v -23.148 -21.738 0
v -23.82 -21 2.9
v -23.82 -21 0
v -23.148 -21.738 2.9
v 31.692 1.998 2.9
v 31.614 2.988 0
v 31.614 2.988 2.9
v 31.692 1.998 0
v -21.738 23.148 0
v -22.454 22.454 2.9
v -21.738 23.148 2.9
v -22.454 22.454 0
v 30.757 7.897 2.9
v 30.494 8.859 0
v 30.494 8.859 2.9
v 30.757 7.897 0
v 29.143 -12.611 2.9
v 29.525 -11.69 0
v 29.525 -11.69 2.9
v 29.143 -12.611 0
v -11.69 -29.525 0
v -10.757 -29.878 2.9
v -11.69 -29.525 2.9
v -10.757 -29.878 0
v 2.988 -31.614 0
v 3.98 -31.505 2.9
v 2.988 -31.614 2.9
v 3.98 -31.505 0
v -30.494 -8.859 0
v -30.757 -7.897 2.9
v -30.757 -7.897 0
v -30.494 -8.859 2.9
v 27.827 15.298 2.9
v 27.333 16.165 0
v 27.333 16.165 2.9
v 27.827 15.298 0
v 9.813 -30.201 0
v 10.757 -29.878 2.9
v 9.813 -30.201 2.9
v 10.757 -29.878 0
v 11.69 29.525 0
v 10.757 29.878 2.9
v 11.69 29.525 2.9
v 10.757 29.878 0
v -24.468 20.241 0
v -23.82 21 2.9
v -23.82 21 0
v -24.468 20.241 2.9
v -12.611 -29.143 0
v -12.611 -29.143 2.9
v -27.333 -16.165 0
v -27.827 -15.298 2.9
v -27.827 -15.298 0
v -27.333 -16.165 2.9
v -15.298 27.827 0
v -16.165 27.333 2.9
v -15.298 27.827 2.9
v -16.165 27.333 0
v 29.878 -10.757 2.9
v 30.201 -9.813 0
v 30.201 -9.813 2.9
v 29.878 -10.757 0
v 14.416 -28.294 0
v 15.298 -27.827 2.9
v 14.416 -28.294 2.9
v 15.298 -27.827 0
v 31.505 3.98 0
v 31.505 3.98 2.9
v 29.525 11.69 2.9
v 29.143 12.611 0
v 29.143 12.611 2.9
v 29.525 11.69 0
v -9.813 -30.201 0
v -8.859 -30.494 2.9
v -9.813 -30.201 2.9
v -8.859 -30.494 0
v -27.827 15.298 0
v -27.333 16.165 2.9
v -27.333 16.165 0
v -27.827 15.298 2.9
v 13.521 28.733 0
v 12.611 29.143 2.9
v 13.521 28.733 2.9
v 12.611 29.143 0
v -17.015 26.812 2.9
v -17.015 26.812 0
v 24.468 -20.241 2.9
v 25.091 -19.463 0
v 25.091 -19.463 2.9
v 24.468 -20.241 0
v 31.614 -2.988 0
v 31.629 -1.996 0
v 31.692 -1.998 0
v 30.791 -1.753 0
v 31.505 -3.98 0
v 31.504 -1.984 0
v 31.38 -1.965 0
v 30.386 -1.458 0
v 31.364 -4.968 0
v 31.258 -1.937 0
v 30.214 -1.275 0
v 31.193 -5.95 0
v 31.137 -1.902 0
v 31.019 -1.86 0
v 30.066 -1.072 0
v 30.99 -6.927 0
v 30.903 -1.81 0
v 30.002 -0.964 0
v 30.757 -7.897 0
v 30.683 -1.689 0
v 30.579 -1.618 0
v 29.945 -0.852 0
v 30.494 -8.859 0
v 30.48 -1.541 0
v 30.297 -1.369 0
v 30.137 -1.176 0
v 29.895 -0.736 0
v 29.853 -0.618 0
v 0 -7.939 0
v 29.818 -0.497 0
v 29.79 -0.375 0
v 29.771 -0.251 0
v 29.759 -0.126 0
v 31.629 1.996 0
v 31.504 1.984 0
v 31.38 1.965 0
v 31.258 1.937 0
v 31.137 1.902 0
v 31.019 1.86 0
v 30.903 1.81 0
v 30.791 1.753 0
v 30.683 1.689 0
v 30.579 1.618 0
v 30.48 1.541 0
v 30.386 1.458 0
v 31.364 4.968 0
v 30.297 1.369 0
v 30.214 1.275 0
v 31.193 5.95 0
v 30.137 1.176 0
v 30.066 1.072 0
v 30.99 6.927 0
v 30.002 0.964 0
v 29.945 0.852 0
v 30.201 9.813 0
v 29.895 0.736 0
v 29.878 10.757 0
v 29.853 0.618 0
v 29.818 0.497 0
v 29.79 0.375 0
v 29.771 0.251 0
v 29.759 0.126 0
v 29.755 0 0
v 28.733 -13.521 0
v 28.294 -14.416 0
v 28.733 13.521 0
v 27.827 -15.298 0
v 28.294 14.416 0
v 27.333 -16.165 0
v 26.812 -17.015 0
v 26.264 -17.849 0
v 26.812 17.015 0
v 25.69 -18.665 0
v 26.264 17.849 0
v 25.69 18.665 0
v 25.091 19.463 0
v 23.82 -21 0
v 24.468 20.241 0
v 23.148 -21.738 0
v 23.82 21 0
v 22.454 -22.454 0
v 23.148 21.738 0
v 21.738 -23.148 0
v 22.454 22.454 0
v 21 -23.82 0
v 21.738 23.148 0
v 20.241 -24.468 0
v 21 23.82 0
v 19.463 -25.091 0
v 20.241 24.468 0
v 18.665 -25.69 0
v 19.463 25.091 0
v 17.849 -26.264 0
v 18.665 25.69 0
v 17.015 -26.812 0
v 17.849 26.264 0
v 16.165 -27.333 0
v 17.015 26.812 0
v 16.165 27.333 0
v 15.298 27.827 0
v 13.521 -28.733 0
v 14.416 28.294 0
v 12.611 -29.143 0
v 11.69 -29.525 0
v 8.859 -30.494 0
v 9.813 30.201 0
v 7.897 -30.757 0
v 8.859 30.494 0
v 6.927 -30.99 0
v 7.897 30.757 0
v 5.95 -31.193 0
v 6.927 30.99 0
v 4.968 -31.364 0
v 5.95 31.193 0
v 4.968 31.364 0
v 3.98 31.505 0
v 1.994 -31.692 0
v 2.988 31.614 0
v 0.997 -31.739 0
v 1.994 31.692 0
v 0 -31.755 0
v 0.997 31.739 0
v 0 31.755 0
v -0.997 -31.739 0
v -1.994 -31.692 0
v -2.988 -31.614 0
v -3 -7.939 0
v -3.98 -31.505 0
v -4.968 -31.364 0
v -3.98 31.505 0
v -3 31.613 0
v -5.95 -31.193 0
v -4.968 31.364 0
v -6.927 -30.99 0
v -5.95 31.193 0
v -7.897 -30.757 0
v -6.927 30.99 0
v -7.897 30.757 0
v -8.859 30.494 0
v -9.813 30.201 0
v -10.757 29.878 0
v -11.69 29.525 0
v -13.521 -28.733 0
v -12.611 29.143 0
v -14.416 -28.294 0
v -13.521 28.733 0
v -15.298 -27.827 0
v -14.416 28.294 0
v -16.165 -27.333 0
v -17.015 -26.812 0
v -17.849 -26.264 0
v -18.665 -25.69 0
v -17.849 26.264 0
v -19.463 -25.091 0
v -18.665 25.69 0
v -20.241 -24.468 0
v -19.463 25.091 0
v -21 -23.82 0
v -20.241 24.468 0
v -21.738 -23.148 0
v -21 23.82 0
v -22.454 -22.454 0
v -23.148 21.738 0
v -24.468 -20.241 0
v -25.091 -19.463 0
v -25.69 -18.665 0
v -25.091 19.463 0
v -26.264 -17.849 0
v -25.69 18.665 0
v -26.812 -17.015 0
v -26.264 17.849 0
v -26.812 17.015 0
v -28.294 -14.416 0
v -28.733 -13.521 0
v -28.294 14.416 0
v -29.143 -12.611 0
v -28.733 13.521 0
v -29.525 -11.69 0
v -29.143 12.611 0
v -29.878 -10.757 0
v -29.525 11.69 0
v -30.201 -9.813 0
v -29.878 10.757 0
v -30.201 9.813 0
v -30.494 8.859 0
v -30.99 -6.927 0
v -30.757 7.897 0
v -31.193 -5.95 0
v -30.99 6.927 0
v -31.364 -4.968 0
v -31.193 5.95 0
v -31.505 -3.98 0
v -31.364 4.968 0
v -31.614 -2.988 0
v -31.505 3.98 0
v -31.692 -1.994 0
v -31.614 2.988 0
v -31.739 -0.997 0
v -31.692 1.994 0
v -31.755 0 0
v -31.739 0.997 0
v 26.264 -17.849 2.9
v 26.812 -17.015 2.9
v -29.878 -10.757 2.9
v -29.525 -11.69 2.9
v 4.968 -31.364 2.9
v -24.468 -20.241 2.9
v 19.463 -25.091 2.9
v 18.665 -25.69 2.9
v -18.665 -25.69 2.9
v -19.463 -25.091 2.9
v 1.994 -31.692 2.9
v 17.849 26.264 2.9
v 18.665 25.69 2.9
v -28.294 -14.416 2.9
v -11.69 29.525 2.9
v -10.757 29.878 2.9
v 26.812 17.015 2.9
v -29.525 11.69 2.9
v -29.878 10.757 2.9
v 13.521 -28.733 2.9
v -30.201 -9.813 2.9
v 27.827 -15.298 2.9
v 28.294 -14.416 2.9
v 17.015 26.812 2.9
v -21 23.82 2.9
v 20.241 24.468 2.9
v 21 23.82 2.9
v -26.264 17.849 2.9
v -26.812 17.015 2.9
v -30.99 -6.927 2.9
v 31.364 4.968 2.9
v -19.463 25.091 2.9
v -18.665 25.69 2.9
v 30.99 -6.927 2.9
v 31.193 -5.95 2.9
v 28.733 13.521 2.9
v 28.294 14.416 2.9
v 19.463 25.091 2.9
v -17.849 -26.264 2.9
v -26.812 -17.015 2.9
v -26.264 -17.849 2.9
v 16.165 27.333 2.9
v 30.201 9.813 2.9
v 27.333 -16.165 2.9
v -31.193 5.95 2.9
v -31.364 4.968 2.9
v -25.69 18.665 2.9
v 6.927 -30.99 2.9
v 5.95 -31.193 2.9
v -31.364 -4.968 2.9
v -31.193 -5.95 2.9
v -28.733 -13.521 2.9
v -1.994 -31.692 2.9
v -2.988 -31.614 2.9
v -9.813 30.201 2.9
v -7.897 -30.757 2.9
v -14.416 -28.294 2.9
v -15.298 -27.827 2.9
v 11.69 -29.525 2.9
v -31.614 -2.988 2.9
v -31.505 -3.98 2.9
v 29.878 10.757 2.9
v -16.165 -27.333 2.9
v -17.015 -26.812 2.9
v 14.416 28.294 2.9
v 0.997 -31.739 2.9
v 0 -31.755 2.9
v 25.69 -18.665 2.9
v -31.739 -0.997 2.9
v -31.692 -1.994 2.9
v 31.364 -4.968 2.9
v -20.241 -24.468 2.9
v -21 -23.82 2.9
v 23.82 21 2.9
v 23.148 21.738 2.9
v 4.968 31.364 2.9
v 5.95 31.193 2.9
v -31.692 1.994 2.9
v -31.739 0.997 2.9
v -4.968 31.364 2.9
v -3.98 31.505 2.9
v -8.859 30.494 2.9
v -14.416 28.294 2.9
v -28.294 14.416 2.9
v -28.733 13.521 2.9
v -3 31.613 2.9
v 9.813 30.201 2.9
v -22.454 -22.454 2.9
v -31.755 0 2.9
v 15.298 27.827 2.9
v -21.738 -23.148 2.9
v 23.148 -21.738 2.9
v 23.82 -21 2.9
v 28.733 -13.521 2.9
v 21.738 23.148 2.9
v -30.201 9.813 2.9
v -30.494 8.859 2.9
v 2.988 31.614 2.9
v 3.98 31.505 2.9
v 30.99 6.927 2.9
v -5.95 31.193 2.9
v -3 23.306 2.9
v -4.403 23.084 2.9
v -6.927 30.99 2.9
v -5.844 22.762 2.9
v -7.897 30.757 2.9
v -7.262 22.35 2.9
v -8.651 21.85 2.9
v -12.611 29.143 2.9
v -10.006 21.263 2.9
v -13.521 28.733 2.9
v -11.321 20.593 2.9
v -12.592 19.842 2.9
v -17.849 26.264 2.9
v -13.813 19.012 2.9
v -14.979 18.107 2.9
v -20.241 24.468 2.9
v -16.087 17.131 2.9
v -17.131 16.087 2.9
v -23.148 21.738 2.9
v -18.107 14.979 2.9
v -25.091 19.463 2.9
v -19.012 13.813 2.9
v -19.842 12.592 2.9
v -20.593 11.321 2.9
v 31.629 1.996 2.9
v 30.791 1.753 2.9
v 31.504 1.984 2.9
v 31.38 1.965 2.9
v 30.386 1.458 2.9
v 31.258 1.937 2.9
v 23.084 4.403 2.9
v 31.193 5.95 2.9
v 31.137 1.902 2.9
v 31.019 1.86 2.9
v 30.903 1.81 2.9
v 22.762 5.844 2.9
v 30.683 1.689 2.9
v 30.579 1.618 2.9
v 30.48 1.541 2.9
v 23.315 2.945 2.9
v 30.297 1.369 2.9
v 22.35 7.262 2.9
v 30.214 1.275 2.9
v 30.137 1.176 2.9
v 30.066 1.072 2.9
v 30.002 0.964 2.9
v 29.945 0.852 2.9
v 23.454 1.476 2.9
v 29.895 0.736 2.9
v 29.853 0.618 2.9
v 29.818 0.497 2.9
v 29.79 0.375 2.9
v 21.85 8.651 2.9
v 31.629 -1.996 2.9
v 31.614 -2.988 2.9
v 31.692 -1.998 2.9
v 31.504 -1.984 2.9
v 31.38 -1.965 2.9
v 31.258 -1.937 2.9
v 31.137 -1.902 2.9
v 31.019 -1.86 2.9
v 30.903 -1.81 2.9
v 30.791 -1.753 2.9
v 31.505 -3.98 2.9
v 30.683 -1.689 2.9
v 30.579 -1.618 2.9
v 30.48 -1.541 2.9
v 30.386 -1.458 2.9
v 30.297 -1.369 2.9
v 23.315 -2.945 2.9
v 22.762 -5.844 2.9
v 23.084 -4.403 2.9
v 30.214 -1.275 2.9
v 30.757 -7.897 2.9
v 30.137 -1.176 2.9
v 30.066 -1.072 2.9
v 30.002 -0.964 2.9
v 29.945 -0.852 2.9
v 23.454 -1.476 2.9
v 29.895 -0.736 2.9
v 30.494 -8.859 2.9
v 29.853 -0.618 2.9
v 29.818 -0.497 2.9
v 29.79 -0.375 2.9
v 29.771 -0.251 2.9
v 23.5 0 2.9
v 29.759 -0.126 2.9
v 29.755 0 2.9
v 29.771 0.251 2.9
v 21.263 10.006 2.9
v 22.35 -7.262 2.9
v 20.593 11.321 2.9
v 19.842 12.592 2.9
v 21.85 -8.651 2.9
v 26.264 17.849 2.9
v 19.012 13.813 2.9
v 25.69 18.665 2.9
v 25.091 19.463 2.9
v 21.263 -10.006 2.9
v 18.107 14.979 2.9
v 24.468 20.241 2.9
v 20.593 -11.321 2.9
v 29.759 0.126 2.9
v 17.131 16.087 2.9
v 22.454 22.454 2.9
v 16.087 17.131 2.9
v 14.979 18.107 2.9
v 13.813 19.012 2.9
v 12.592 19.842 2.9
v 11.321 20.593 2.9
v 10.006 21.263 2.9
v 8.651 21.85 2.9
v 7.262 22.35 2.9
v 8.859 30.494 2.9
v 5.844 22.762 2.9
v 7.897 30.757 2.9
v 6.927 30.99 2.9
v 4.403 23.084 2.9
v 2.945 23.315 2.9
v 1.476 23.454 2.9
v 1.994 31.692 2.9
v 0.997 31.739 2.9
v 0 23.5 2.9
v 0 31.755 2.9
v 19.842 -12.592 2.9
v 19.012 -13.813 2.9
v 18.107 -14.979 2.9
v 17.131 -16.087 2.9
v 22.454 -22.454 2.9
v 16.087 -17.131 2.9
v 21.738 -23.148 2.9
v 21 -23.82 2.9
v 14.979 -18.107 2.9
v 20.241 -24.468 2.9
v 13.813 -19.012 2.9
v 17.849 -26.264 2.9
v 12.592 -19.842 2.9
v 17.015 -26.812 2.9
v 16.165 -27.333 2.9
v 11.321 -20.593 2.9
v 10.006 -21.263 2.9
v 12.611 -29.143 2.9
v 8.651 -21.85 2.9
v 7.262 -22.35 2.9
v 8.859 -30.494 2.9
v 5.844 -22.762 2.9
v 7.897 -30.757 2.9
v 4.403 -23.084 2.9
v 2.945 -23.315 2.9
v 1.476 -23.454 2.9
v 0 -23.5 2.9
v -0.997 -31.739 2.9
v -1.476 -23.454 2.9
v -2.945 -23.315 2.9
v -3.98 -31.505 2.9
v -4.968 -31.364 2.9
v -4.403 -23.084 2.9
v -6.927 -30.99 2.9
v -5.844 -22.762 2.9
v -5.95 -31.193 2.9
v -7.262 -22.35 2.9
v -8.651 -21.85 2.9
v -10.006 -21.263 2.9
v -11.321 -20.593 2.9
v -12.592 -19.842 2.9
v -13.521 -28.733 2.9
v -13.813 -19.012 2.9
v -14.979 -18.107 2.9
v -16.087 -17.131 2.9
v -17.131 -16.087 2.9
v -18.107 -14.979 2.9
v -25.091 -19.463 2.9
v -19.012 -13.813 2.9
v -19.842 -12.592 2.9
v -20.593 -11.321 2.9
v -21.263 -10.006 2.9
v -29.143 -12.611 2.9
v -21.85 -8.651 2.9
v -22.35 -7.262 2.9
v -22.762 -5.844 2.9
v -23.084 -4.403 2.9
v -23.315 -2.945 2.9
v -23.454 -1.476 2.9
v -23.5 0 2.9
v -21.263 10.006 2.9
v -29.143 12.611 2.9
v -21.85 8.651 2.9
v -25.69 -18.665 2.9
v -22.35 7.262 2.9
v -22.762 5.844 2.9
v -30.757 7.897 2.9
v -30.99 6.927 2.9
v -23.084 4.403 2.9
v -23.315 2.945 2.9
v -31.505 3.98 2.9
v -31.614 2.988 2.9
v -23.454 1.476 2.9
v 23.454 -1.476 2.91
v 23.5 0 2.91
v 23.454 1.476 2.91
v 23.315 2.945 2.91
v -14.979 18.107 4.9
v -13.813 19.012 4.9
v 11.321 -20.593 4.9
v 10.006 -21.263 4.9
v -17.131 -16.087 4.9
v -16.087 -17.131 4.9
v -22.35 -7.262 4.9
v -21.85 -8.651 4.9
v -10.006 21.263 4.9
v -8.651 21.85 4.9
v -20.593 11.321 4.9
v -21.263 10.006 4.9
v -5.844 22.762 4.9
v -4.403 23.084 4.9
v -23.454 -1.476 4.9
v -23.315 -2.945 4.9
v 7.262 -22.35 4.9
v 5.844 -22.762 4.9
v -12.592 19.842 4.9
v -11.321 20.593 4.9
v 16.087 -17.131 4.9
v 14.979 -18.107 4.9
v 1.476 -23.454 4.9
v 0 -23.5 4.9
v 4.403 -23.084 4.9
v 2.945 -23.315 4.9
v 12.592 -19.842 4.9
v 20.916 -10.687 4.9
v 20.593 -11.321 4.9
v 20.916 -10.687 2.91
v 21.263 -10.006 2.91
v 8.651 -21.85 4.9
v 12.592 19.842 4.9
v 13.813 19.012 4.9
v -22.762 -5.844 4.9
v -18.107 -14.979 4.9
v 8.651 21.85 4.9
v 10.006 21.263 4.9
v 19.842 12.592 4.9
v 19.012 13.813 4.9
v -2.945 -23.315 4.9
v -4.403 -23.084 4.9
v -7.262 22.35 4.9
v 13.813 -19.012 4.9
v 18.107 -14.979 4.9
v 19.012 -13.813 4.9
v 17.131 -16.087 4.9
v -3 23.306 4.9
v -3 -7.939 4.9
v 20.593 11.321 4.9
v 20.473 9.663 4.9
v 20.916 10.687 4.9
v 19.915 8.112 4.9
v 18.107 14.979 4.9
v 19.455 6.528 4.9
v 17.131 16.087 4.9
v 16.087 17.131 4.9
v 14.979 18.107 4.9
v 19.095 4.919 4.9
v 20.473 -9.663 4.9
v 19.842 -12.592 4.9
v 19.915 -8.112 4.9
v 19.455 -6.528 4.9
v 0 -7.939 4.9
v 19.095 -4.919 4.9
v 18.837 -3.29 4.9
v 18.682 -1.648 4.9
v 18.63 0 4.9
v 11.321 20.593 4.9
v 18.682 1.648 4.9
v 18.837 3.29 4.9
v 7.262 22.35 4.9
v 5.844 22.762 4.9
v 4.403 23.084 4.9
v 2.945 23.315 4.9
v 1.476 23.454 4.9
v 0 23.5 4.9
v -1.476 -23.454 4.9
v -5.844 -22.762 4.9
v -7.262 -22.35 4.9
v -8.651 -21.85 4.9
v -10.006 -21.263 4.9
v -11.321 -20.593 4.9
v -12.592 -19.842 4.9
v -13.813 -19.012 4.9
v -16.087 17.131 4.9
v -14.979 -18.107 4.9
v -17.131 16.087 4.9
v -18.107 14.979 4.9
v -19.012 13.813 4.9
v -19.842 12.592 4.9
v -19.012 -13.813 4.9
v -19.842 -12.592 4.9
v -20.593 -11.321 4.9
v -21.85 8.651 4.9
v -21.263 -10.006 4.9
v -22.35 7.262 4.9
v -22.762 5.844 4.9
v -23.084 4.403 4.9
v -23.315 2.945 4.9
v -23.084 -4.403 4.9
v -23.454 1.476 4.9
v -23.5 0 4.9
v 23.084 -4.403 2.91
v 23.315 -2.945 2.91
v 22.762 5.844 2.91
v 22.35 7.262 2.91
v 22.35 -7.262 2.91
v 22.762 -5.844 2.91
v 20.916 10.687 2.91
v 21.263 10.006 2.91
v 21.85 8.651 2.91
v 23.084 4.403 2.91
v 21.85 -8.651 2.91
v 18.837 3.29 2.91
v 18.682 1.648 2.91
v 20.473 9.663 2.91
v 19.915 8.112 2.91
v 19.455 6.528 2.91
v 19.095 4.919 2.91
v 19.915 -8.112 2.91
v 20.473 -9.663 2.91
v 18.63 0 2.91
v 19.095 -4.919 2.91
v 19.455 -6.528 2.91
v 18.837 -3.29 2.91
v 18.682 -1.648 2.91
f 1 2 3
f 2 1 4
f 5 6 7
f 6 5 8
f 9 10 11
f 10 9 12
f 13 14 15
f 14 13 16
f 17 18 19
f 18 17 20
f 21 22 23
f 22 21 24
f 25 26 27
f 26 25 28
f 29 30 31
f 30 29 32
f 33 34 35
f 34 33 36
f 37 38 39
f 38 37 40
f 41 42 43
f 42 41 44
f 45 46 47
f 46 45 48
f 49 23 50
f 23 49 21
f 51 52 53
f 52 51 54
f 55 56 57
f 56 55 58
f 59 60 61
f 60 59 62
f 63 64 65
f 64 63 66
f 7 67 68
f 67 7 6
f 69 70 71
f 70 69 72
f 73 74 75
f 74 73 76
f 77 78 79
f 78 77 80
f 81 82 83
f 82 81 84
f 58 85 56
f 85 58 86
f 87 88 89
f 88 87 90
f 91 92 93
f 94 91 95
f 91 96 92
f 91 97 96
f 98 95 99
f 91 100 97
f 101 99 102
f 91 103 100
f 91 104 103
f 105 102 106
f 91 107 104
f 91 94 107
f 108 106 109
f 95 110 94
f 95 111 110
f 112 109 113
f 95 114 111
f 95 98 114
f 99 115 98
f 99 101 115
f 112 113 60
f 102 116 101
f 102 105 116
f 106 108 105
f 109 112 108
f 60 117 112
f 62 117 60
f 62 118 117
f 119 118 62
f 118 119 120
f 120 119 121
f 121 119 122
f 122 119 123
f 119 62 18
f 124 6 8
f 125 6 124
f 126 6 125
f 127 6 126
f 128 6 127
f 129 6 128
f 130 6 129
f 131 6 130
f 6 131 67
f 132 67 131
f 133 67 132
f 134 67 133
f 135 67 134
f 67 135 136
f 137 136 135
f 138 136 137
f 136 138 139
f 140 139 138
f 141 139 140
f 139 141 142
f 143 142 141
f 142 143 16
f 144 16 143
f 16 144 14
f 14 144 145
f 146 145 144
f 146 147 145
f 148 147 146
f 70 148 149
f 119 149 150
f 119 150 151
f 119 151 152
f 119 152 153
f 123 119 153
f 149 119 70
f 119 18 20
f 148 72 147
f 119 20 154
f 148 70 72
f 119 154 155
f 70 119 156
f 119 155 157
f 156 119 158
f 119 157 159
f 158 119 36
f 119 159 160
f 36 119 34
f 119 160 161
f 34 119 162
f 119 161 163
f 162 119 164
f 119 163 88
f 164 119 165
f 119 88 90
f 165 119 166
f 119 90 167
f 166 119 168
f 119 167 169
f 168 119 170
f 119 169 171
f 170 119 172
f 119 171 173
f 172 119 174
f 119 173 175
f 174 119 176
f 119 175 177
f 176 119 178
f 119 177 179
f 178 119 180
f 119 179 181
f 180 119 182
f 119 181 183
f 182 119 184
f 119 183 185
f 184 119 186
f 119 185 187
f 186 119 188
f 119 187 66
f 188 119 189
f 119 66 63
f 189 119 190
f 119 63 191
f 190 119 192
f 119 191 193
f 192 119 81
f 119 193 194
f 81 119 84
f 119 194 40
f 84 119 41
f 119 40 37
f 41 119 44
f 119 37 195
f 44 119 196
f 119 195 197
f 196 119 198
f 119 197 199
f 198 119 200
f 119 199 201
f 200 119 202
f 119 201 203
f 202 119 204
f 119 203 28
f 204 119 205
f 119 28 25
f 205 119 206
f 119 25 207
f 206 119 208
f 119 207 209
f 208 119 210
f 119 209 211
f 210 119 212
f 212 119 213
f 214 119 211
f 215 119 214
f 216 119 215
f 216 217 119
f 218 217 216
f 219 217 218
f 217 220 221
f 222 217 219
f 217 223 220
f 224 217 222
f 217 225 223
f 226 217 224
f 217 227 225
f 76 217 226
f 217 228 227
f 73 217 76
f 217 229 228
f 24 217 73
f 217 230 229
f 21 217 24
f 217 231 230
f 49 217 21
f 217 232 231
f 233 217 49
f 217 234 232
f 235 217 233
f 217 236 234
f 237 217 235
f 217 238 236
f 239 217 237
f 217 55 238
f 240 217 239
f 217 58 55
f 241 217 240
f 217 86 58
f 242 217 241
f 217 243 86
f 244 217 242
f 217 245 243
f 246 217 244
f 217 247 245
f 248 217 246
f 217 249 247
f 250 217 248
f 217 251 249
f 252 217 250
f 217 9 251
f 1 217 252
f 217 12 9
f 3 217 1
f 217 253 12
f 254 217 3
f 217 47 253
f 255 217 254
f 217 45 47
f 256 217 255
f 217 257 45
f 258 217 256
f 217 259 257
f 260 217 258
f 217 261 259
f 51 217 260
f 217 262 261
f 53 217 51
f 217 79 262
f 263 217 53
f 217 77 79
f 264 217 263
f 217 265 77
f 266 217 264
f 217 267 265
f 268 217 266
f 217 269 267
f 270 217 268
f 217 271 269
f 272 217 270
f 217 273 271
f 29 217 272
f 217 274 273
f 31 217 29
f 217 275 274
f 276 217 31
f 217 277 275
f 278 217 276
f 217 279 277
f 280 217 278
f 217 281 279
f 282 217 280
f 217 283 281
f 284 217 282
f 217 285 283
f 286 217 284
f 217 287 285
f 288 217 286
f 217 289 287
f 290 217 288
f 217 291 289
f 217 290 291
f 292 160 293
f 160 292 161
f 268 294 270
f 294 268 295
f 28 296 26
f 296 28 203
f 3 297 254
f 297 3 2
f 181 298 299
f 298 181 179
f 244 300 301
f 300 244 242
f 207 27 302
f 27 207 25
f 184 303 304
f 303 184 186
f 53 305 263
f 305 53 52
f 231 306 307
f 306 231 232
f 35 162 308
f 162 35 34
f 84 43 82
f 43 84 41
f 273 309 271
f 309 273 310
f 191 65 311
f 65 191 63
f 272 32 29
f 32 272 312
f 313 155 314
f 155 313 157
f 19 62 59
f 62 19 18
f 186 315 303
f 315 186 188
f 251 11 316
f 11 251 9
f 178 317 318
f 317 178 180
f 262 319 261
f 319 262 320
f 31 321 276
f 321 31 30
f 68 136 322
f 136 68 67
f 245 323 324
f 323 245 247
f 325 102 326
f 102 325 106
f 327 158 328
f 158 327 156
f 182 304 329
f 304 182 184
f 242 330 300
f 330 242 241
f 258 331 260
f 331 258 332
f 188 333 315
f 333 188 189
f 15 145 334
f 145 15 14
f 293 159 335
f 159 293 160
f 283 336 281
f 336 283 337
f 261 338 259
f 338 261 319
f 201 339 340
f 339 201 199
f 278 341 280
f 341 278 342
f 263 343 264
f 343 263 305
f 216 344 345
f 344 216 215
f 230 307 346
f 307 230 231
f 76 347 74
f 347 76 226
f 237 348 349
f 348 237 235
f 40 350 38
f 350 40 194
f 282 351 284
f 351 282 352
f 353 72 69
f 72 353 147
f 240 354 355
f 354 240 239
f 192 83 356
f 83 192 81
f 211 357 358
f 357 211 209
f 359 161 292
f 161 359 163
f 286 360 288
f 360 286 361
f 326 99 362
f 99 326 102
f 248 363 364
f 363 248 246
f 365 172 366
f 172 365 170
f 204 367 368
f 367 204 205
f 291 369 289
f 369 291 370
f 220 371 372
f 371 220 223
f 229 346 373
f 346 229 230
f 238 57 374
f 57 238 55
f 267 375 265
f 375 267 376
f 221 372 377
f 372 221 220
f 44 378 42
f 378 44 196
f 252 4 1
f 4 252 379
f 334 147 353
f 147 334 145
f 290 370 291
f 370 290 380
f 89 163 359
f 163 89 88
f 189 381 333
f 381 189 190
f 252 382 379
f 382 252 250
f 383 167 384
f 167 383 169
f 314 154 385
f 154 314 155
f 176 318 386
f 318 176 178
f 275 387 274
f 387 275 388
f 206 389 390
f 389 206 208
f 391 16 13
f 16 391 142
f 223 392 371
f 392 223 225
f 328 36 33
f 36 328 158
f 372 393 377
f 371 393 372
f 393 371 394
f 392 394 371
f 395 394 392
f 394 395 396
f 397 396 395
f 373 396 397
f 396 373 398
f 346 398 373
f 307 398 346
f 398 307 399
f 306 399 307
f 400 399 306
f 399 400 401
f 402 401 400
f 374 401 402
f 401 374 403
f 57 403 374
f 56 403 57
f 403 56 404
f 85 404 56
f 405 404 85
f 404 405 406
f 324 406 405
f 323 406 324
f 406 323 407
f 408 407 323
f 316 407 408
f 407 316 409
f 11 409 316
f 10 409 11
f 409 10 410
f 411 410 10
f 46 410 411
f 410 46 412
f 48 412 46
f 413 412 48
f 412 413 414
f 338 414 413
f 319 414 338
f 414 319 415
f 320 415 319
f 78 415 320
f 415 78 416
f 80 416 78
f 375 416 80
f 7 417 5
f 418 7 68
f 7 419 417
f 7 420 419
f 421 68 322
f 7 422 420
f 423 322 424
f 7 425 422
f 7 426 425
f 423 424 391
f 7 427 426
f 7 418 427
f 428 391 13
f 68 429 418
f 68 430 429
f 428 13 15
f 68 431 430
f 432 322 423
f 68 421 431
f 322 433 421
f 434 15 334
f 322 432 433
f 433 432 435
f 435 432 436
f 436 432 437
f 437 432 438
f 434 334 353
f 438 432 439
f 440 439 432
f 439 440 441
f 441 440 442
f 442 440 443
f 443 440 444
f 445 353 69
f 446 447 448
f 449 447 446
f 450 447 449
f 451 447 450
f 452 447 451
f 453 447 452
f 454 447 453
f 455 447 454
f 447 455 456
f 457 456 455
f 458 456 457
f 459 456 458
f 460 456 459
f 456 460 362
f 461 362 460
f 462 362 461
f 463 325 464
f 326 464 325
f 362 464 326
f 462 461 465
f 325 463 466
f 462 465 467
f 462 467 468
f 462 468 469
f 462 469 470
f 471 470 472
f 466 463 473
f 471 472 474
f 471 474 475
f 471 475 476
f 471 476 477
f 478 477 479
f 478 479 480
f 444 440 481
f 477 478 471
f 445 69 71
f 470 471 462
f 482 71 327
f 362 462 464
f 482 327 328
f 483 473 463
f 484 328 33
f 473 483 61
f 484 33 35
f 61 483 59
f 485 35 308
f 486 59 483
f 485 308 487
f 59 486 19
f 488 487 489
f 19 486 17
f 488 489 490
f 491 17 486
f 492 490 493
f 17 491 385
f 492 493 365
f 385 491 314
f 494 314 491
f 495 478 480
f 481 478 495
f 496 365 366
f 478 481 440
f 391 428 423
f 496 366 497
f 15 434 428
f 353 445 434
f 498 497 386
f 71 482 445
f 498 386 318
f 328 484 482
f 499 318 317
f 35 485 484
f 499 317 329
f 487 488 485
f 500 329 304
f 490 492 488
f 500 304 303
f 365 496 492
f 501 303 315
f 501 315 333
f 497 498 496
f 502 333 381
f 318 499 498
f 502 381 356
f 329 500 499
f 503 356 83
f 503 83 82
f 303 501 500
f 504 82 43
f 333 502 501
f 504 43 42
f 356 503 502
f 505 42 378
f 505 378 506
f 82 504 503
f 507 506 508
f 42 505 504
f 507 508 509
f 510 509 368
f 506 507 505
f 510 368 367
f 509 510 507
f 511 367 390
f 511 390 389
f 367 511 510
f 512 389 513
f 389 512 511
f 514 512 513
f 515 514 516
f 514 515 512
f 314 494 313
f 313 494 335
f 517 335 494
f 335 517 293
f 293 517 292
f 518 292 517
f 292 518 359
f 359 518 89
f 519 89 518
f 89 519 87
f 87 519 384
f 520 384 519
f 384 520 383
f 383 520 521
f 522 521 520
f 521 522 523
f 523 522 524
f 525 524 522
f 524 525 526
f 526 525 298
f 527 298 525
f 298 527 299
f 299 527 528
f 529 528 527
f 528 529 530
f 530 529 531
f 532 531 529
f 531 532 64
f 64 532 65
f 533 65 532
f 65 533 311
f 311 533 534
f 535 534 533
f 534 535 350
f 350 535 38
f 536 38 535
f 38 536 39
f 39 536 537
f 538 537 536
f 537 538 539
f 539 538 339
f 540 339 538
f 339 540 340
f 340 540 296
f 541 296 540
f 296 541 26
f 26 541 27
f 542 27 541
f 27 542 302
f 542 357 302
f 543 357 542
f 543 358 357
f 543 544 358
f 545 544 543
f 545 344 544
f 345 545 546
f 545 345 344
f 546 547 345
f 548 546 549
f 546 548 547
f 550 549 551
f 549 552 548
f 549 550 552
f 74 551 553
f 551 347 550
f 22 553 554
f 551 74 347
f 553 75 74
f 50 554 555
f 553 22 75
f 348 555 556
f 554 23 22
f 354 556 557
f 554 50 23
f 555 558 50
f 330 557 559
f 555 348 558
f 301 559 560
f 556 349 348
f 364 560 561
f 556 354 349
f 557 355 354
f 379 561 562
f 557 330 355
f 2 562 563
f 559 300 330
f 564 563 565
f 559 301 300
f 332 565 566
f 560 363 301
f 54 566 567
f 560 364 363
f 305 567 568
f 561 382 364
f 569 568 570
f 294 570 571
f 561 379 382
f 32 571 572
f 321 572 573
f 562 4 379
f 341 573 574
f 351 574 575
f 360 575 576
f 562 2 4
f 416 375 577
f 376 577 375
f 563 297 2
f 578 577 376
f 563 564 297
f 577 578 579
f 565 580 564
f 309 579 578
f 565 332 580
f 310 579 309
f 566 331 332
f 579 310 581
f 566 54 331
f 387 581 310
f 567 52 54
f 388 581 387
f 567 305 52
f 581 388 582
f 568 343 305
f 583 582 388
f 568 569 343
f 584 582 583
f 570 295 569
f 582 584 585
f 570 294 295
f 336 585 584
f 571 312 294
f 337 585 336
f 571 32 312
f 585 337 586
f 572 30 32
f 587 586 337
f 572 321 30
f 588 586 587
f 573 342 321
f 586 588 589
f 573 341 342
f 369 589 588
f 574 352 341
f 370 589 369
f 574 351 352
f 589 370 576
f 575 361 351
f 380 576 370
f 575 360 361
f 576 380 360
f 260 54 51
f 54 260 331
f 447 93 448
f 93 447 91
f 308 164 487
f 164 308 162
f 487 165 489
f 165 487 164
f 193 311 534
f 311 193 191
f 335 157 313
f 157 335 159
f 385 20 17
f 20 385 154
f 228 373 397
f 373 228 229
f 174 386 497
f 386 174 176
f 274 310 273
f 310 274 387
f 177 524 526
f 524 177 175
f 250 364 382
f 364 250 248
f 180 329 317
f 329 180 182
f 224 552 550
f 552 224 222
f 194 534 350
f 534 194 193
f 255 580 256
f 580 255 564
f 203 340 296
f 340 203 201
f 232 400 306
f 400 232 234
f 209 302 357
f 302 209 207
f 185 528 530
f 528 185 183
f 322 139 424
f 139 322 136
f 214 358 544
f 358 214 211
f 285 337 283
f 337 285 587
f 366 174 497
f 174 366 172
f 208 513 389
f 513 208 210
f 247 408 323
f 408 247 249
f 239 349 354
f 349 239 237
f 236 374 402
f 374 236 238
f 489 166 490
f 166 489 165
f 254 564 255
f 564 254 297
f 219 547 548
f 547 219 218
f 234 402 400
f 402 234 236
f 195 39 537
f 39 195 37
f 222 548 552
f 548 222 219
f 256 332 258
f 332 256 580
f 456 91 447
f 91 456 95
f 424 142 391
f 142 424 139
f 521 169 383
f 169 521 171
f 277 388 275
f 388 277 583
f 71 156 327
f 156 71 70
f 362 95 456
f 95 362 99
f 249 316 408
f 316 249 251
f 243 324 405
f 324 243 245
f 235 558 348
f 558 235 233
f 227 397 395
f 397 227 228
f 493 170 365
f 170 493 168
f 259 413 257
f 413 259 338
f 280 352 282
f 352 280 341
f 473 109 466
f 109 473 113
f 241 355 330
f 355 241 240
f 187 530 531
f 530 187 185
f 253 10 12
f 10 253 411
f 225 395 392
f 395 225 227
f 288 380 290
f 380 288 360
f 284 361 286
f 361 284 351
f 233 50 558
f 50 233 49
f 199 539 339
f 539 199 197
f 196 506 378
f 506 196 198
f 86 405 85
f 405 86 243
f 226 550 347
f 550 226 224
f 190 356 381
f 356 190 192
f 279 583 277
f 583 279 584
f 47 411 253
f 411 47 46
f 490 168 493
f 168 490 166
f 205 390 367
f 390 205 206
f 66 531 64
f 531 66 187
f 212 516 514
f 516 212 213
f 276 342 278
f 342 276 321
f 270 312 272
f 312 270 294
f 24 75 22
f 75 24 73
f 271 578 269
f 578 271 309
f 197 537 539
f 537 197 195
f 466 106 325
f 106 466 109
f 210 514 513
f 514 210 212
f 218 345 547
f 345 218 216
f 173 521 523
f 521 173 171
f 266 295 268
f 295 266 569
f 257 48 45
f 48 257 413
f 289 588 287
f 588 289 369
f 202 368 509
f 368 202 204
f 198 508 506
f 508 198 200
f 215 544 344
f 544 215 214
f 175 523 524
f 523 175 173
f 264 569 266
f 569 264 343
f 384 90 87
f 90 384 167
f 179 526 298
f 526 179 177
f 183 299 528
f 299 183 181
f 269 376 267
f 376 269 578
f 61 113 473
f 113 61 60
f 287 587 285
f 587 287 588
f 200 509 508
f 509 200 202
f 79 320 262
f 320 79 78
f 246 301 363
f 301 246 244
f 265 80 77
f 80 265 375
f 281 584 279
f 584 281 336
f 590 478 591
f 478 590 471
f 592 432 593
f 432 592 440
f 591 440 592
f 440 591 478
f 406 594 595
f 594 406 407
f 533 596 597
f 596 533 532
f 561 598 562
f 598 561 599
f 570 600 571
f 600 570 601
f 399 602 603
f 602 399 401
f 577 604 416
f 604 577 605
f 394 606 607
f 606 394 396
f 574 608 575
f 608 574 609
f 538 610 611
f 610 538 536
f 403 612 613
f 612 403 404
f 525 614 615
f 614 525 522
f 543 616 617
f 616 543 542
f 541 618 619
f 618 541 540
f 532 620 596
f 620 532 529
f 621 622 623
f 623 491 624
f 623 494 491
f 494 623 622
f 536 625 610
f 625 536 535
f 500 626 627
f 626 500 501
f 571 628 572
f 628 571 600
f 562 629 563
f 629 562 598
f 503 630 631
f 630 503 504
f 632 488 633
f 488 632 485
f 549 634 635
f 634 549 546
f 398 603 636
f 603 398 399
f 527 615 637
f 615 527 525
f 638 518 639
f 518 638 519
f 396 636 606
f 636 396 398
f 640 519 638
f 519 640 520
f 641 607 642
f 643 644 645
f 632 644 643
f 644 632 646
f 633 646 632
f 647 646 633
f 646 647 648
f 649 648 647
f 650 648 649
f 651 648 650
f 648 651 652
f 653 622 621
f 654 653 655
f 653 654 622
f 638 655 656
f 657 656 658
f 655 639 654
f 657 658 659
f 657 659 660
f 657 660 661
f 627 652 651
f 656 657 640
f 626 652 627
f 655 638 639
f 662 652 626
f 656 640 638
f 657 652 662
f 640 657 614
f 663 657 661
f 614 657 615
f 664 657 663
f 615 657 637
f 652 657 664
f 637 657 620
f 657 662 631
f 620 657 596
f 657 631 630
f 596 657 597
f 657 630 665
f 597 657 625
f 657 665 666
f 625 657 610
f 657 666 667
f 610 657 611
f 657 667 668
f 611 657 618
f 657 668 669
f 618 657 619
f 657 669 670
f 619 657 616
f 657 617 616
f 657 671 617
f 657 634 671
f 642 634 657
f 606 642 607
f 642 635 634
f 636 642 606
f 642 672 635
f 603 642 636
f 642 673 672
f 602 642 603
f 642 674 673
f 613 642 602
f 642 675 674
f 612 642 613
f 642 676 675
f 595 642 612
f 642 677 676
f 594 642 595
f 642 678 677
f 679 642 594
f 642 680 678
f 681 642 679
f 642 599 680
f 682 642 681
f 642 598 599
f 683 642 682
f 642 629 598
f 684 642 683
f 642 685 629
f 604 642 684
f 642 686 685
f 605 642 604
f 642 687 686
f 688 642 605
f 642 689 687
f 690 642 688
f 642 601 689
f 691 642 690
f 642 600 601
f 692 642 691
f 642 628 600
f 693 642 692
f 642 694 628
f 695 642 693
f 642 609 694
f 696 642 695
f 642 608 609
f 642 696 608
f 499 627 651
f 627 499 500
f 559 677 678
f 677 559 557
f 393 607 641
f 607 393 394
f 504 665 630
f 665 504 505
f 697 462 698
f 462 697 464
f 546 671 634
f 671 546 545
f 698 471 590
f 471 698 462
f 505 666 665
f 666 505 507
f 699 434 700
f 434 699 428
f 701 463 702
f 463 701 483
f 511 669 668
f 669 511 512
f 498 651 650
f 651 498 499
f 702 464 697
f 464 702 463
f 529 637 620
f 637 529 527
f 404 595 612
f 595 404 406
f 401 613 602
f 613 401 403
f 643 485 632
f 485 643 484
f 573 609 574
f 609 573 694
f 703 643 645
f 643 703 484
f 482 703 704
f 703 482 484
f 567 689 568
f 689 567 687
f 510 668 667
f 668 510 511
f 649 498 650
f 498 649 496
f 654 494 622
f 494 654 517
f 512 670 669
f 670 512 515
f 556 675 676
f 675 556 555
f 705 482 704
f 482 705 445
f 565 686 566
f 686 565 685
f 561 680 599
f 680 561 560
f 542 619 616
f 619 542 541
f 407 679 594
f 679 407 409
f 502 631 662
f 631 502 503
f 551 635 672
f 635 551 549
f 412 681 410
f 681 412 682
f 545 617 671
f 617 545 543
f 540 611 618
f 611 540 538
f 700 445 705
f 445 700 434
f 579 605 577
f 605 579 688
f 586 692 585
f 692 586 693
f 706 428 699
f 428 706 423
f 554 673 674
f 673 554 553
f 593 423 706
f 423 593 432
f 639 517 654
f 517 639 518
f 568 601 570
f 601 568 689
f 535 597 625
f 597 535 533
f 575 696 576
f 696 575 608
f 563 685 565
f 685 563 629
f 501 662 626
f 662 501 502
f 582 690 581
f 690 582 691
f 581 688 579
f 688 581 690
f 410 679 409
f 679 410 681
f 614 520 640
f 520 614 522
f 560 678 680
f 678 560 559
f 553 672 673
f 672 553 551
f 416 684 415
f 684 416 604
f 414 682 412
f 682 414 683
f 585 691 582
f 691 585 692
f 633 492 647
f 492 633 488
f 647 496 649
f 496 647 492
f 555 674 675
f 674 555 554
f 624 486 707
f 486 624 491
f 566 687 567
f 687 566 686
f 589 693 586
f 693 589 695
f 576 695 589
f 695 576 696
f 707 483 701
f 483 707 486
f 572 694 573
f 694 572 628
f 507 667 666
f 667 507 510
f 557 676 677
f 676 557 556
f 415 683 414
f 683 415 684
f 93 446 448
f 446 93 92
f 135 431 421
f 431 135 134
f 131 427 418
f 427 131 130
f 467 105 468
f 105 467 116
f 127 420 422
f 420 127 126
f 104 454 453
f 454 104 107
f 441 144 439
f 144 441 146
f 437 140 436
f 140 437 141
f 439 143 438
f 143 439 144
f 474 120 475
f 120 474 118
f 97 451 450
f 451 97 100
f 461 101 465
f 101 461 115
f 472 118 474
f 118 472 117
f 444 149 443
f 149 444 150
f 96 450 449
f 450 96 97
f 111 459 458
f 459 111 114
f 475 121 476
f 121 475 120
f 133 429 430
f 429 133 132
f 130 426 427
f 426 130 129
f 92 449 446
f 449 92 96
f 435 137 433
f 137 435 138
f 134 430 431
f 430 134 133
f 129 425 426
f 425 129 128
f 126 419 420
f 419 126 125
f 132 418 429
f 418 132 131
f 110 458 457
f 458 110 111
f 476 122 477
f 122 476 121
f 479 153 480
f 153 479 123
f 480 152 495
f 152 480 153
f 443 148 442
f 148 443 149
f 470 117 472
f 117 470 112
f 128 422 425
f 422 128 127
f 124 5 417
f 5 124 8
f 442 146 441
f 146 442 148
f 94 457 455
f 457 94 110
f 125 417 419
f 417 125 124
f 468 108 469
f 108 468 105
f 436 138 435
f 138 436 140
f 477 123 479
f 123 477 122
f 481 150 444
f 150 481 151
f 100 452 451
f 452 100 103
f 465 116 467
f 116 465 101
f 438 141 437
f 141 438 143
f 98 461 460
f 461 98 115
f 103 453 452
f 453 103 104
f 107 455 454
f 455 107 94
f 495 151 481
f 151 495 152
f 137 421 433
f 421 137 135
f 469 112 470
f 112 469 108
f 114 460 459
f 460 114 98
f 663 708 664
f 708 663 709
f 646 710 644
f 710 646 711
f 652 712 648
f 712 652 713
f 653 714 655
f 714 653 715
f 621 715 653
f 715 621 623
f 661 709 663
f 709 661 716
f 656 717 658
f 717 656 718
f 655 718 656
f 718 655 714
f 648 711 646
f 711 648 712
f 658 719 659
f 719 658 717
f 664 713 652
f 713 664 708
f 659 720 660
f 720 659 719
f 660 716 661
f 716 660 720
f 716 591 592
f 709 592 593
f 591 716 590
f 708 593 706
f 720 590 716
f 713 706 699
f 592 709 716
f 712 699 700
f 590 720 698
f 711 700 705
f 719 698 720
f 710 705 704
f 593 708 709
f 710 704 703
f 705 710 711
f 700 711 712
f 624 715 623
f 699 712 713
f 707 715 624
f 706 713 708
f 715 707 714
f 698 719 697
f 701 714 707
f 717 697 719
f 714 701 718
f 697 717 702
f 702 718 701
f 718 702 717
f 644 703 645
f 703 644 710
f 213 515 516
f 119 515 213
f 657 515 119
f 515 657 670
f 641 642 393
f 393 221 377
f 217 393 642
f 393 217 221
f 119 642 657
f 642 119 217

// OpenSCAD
// All measurements in millimeters

// Encompassing disk for the plate
DISK_DIAMETER = 63.51;  
DISK_THICKNESS = 2.9;  

// Underneath the disk is another disk
UNDER_DISK_DIAMETER = 47;
UNDER_DISK_THICKNESS = 2;

// But a little bit of the underdisk is cut out
HALF_MOON_UNDERCUT_DIAMETER = 30 * 1.75;

// Through the meat of the circle is notch cut out
NOTCH_CUT_OUT_DIAMETER = 4;

// Offsets for the various cutouts
NOTCH_OFFSET = DISK_DIAMETER / 2;
HALFMOON_OFFSET = ( DISK_DIAMETER / 2 ) + ( HALF_MOON_UNDERCUT_DIAMETER / 4 );

BLADE_PASS_THROUGH_WIDTH = 3;
BLADE_PASS_THROUGH_OFFSET_Y = DISK_DIAMETER/8;
BLADE_PASS_THROUGH_OFFSET_X = -1.5;

module main_body() {
  union() {
    // Main disk body
    cylinder(h=DISK_THICKNESS, d=DISK_DIAMETER, $fn=200);
      
    // Under circle - actually drawn on top
    translate([0, 0, DISK_THICKNESS])
       cylinder(h=UNDER_DISK_THICKNESS, d=UNDER_DISK_DIAMETER, $fn=100);
  }
}
          
        
      
// Main module for the disk
module main_disk() {
   difference() {
      main_body();
               
      // Notch
      translate([NOTCH_OFFSET, 0, -1])
         cylinder(h=DISK_THICKNESS + 2, d=NOTCH_CUT_OUT_DIAMETER, $fn=100);
       
      translate([HALFMOON_OFFSET, 0, DISK_THICKNESS+0.01]) 
         cylinder(h=UNDER_DISK_THICKNESS + 1, d=HALF_MOON_UNDERCUT_DIAMETER, $fn=100);
       
      
      translate([-BLADE_PASS_THROUGH_WIDTH/2 + BLADE_PASS_THROUGH_OFFSET_X, 
                 -BLADE_PASS_THROUGH_OFFSET_Y, 
                 -1])
         cube( [BLADE_PASS_THROUGH_WIDTH,
                DISK_DIAMETER, 
                DISK_THICKNESS + UNDER_DISK_THICKNESS + 2], center=false);
        
 
         
    }
}

// Render the disk
main_disk();
